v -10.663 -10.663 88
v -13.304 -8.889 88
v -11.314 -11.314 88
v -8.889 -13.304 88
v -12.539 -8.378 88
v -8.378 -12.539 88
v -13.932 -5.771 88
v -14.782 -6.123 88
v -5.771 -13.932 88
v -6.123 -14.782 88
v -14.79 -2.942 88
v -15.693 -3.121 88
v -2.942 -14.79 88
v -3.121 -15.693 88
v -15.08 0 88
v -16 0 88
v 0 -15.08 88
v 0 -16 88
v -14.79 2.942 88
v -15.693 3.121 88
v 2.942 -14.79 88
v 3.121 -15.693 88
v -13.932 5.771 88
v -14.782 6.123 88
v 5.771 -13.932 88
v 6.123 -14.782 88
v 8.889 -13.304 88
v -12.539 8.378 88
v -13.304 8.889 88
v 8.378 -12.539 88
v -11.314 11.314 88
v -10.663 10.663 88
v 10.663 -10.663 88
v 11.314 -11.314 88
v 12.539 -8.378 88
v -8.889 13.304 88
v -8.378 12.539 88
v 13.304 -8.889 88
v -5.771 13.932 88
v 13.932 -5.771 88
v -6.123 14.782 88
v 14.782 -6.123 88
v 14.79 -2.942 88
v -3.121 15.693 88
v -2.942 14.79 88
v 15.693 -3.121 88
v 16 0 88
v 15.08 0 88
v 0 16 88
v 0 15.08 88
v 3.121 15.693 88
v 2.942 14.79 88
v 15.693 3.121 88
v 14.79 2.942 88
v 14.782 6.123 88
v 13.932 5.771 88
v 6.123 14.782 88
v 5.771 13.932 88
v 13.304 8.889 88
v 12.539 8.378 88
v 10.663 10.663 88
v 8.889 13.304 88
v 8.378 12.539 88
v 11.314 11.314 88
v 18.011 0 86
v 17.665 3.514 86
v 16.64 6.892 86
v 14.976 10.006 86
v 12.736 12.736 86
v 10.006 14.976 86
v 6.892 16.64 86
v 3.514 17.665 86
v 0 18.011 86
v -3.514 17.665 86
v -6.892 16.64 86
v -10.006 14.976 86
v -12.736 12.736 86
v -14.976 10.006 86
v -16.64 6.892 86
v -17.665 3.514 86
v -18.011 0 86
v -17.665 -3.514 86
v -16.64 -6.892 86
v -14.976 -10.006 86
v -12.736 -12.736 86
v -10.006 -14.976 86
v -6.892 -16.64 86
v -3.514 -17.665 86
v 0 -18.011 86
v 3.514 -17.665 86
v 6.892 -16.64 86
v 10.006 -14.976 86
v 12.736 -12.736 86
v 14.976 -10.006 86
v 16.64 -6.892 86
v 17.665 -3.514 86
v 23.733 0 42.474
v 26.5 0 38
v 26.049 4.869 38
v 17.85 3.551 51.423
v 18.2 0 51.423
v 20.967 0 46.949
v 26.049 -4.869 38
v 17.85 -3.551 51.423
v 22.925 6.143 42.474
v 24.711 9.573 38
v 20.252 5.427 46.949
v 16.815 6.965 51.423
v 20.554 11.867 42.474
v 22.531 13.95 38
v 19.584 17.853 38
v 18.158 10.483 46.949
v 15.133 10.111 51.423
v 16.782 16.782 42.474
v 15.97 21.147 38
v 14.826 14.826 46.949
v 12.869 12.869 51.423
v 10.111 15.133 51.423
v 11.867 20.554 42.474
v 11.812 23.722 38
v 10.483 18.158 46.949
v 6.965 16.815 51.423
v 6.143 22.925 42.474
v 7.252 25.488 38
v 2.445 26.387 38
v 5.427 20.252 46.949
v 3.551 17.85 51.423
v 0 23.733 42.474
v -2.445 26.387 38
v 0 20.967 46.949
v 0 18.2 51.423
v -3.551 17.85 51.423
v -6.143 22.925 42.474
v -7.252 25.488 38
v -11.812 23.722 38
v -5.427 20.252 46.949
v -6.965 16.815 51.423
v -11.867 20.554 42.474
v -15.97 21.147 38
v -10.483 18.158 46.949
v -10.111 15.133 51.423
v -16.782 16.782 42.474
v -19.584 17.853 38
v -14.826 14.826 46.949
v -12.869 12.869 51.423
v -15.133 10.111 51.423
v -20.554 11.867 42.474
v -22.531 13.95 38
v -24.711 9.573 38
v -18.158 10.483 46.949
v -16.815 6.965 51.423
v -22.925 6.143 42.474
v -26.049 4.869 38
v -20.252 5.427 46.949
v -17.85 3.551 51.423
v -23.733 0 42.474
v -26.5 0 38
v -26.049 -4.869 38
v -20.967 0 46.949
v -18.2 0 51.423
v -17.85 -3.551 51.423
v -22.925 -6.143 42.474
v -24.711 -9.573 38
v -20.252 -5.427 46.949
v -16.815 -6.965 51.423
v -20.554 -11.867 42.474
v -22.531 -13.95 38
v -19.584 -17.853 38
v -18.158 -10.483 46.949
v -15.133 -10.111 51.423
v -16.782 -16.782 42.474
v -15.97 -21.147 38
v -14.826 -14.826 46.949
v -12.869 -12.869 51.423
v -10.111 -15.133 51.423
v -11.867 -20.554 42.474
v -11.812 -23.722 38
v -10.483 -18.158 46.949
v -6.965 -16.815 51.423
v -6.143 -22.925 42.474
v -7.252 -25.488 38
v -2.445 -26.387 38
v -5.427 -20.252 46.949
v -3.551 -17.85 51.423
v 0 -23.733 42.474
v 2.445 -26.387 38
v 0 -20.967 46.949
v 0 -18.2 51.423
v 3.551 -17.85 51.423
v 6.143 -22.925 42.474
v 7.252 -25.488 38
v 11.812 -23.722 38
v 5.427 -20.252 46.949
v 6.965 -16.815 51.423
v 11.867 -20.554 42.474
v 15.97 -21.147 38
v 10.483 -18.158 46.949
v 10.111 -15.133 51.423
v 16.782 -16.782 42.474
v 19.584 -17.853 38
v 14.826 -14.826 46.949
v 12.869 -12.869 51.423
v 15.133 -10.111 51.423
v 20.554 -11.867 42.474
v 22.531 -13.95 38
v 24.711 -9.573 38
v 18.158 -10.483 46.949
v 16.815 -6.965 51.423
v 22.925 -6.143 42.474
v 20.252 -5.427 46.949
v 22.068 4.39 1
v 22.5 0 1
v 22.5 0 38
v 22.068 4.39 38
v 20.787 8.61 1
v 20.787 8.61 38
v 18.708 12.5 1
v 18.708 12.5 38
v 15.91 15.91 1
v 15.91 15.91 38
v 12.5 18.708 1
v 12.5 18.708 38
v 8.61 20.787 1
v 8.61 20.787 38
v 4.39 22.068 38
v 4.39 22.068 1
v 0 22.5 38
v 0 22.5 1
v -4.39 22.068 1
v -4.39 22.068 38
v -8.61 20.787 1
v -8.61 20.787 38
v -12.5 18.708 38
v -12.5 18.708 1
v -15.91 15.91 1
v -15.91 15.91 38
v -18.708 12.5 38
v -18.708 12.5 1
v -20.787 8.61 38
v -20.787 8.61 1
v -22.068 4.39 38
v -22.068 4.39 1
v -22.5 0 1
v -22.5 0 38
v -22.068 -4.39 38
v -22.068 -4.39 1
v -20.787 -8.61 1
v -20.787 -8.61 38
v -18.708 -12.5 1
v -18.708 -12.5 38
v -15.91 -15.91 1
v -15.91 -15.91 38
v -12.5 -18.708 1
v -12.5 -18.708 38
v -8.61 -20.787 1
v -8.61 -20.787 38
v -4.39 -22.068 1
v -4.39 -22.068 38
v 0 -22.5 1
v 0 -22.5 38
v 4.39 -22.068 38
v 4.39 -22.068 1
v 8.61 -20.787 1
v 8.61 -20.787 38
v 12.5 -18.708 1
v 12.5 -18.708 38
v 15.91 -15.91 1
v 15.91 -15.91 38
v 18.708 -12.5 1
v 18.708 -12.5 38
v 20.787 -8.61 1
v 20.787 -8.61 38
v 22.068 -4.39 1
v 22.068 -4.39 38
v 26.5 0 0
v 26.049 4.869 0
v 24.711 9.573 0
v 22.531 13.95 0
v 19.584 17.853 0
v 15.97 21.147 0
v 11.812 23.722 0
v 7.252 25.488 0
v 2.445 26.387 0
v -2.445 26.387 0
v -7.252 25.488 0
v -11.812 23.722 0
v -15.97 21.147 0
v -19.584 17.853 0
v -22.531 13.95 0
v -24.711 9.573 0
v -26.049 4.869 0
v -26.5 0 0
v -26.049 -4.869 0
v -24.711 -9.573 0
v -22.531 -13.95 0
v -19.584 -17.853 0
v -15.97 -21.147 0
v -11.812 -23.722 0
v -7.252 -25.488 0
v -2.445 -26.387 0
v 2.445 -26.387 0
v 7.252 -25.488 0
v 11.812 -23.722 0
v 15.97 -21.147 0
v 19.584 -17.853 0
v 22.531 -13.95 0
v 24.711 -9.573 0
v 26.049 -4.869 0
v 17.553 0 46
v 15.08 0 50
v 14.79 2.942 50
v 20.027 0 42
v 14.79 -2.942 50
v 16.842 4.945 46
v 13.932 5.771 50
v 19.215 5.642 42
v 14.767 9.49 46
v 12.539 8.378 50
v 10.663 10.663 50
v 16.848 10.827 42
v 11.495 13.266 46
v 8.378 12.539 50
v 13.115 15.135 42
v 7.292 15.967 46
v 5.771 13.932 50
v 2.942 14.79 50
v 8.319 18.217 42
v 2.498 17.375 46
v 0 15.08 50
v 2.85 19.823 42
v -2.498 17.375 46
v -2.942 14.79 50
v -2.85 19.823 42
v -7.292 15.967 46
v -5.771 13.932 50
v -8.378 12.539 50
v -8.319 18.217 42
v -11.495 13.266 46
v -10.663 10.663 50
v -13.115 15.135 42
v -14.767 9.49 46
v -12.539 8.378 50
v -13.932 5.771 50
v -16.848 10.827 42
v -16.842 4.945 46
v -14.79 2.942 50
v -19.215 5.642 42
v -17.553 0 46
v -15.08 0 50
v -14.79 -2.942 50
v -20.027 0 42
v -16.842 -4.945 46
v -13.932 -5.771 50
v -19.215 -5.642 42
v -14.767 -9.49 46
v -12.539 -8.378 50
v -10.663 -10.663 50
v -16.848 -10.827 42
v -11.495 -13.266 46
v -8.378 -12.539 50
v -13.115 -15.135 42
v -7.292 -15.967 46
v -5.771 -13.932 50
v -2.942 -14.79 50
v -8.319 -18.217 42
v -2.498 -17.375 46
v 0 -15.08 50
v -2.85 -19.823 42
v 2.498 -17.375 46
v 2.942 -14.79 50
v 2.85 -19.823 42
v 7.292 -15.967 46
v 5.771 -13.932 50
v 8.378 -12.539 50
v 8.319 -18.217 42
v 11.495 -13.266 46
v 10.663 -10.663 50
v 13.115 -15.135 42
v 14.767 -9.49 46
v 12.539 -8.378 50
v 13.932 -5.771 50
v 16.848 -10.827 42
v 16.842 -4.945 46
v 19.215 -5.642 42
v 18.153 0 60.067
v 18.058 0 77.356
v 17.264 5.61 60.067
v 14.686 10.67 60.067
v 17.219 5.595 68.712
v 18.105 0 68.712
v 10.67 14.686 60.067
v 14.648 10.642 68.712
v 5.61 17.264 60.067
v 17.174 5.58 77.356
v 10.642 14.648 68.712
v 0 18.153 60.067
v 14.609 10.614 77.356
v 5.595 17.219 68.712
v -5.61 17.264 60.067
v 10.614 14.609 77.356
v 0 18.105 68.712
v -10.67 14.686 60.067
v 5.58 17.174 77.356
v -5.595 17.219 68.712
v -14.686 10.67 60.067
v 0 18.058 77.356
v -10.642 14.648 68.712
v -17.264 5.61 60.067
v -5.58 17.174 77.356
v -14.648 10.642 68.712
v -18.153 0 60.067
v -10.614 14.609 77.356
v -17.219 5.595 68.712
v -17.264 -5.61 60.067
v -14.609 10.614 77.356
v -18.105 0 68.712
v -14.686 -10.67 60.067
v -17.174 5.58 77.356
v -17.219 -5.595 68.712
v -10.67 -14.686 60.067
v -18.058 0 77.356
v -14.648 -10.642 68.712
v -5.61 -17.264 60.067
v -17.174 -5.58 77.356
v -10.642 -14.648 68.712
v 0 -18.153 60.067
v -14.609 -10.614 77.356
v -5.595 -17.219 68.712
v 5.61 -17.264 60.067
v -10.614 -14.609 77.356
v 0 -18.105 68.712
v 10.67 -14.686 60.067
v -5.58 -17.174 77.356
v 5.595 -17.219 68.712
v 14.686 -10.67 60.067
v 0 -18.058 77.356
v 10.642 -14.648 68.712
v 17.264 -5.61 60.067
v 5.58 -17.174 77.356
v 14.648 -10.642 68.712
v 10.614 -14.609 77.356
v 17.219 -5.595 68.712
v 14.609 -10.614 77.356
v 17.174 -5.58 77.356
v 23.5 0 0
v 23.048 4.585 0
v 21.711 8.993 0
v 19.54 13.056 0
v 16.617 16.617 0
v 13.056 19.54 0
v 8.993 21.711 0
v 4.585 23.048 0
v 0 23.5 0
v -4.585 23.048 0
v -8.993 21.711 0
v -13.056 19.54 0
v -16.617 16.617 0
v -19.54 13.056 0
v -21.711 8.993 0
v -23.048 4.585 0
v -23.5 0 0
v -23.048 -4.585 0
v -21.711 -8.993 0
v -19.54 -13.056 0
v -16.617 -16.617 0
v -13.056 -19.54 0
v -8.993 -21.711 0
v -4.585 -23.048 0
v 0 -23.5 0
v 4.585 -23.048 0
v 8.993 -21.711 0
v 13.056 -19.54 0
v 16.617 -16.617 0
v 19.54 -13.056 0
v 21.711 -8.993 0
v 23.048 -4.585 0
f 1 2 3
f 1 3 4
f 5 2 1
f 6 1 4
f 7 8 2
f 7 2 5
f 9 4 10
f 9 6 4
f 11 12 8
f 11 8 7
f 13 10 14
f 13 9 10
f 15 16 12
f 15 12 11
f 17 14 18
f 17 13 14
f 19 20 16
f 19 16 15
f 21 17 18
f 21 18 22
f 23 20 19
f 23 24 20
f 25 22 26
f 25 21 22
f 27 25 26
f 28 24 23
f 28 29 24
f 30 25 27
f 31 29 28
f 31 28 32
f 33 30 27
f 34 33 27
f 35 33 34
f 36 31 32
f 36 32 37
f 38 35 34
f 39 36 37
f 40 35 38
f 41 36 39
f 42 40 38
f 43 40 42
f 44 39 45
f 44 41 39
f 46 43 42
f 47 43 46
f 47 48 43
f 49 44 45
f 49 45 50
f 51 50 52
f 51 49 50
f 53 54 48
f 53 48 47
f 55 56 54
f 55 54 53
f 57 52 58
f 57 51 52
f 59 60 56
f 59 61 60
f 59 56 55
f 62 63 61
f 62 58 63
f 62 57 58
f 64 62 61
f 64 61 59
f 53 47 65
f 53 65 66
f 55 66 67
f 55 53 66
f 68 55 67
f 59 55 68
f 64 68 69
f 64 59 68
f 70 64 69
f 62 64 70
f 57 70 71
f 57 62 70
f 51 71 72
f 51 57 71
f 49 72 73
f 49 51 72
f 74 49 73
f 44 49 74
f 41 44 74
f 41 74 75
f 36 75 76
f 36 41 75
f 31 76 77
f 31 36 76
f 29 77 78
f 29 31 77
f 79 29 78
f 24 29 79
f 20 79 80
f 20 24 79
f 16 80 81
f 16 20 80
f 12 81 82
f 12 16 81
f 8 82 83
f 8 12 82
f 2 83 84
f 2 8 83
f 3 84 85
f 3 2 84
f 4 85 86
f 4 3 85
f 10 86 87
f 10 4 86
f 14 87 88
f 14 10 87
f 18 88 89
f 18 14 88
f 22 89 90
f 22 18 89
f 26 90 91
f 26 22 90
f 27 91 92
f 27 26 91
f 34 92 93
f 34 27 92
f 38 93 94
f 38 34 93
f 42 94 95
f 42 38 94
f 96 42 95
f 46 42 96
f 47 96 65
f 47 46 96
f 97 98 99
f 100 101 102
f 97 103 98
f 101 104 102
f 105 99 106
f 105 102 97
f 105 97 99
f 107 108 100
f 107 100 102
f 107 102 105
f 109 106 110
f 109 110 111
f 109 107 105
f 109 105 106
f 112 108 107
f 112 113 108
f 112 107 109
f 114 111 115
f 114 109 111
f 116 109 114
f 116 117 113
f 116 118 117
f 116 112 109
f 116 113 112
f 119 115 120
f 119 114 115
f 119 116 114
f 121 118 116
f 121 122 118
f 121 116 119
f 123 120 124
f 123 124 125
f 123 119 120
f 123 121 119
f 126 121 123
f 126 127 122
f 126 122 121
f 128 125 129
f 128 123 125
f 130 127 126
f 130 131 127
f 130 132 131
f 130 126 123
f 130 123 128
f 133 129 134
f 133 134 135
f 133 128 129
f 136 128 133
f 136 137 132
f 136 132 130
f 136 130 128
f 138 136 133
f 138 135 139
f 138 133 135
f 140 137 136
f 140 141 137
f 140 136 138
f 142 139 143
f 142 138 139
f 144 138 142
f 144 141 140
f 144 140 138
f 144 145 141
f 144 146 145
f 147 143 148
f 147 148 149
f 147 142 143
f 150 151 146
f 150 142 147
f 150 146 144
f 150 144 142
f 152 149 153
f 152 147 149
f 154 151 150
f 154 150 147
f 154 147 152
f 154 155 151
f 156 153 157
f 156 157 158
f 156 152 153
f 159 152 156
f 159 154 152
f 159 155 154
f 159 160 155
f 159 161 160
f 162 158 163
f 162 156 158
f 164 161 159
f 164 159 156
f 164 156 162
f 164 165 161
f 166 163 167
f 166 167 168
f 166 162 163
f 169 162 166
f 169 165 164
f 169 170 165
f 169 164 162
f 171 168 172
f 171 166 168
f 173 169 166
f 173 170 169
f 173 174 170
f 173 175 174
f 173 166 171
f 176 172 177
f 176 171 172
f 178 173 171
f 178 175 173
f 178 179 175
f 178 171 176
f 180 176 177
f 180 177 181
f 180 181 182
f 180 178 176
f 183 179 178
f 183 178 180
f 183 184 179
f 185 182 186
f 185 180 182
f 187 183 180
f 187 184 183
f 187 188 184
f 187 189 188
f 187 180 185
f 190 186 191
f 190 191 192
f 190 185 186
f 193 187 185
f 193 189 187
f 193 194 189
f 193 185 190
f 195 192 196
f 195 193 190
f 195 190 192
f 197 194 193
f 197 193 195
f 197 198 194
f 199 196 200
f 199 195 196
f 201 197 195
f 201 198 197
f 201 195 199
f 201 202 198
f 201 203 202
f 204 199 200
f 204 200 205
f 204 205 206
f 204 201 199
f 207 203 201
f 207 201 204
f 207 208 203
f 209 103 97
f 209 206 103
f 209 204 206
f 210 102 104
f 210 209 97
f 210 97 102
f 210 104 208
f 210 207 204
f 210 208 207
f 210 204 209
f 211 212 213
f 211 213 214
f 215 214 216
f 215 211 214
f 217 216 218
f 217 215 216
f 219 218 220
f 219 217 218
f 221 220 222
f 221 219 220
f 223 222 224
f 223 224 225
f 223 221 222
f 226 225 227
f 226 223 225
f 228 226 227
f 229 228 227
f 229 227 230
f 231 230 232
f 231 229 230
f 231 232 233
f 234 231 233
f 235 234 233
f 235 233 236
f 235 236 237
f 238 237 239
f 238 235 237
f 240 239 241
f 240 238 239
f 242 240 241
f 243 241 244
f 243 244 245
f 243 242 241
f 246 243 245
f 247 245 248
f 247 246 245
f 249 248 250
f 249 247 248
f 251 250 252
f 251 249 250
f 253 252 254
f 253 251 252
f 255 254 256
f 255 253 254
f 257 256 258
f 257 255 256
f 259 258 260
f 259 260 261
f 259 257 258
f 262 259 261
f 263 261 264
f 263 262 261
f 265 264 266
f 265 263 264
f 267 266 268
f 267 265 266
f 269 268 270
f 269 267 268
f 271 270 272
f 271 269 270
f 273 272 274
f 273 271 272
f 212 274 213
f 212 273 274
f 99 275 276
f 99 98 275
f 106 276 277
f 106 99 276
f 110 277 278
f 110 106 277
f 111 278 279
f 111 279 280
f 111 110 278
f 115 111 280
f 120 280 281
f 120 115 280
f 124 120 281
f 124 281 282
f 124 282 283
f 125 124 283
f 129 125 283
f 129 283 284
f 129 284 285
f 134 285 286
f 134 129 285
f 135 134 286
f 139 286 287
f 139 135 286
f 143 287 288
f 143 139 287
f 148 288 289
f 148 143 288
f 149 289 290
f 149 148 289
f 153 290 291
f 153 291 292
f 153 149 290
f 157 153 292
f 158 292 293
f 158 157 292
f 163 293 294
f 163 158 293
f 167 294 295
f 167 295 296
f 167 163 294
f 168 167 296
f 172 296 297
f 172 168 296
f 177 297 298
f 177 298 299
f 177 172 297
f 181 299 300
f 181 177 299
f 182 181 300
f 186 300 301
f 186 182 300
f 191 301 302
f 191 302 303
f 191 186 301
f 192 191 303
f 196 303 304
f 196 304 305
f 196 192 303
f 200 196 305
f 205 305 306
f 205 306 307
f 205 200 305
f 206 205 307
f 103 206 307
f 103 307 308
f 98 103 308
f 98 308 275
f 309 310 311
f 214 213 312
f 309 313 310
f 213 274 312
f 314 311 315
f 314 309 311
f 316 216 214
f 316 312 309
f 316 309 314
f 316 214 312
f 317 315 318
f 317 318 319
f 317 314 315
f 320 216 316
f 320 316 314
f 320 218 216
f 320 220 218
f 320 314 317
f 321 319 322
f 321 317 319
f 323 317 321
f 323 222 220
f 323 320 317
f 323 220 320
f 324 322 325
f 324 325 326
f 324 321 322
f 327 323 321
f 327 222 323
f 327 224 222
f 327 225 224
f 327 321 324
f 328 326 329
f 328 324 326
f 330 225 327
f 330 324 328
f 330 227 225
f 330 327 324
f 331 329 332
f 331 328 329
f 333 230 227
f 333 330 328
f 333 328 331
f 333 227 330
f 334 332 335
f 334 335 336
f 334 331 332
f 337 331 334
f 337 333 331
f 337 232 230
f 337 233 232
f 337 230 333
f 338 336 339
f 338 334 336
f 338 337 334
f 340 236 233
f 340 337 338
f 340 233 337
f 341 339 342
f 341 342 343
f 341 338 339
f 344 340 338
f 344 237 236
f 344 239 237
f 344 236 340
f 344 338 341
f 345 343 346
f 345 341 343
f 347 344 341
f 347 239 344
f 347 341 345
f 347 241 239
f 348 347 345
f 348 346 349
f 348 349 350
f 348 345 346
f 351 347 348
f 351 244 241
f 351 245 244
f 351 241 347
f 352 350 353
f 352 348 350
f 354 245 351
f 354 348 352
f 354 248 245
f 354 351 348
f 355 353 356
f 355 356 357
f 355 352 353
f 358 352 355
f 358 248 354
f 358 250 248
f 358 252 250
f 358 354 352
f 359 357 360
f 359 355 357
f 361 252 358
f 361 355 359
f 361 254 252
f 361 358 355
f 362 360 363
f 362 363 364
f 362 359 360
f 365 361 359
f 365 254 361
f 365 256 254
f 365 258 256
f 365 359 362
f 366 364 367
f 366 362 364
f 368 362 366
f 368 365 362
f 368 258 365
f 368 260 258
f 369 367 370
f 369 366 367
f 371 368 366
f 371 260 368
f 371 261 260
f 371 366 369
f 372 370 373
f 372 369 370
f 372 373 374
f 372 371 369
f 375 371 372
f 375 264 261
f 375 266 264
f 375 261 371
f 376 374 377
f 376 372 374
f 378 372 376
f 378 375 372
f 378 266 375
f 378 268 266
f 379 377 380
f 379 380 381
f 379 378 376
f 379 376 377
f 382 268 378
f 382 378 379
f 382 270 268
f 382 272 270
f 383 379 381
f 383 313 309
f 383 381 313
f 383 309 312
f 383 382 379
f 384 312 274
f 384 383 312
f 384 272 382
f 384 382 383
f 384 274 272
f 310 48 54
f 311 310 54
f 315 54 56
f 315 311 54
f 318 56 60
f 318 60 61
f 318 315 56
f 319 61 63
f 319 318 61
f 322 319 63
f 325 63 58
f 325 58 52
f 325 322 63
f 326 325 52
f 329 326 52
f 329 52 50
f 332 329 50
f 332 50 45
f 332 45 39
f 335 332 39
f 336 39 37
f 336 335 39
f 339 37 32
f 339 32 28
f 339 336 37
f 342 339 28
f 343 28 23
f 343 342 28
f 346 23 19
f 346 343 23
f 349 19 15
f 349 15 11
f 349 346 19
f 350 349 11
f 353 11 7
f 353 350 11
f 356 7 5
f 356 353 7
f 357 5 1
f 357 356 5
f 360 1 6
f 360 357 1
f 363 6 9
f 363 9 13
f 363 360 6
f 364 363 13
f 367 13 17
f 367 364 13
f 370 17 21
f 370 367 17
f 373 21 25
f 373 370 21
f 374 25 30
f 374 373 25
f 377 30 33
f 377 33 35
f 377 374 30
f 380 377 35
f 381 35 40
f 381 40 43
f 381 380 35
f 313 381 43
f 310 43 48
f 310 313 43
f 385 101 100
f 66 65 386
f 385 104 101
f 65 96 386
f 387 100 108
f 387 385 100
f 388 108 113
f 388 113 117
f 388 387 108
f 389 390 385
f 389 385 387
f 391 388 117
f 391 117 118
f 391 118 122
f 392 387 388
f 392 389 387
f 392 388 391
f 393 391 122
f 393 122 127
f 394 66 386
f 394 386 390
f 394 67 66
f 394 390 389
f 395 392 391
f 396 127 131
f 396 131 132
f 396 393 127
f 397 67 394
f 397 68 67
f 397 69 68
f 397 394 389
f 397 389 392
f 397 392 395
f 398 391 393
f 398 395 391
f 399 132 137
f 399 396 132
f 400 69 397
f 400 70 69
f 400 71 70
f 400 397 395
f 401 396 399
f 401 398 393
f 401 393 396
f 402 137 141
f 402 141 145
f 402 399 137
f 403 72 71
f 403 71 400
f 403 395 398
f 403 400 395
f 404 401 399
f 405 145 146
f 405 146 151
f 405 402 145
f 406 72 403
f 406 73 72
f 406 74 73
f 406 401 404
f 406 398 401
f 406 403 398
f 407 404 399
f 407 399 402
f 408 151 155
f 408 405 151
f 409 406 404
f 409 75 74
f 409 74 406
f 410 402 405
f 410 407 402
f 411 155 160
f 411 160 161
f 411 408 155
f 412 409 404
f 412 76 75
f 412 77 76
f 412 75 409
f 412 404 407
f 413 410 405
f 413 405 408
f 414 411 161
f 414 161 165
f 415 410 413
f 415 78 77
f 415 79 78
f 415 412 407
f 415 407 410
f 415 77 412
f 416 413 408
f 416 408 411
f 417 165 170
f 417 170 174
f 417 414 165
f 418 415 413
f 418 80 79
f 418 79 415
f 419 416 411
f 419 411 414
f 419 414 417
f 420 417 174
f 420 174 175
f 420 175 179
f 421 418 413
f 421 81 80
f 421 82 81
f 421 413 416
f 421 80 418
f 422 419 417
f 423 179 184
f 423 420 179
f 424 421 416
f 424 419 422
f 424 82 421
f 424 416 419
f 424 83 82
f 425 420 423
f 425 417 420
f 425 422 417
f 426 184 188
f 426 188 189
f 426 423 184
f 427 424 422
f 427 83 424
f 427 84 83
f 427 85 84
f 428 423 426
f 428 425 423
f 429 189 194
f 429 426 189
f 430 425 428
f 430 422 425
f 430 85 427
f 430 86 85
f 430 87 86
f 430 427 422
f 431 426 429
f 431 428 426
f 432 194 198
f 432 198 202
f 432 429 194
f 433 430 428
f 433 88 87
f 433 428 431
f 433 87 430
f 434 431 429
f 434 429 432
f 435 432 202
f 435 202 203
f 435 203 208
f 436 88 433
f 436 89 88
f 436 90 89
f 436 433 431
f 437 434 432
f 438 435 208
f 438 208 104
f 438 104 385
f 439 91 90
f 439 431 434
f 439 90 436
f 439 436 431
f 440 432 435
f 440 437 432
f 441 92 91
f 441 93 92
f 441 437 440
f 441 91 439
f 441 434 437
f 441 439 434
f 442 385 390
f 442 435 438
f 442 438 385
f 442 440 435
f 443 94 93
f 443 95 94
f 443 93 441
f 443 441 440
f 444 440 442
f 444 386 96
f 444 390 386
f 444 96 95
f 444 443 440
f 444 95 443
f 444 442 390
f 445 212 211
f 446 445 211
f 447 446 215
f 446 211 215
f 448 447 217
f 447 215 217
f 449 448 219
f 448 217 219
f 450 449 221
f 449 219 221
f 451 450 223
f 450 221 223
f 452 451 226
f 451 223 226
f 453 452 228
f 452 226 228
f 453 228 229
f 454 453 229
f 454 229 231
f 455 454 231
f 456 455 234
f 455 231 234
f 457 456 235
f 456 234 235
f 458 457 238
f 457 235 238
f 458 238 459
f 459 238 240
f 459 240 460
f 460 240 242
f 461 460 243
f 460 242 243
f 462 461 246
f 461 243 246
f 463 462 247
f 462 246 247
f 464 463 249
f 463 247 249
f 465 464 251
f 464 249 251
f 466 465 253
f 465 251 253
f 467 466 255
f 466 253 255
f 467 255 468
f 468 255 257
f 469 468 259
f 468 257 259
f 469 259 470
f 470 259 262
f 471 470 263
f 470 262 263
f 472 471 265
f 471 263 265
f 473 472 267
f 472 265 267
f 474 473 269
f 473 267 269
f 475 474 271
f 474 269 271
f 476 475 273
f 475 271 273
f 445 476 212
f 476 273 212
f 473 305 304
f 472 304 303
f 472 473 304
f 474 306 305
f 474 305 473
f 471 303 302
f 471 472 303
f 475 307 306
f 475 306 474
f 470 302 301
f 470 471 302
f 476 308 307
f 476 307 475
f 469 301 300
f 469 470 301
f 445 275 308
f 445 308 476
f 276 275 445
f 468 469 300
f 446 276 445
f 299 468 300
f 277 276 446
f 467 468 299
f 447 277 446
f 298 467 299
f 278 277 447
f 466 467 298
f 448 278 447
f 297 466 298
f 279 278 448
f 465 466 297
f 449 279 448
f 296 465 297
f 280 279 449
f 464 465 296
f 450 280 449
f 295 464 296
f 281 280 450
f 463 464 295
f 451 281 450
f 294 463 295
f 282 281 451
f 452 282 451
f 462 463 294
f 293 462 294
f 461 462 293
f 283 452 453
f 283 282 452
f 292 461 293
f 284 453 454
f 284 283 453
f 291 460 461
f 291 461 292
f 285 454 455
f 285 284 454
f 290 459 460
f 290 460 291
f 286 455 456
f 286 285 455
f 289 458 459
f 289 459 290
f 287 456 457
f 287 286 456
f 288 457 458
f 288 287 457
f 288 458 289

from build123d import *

# Parameters (mm, degrees)
F2_SIZE = 2
F3_SIZE = 1


with BuildPart() as f1:
    # F0 (on Front) → F1 (revolve)
    with BuildSketch(Plane.XZ):
        Polygon((22.5, 38), (22.5, 0), (26.5, 0), (26.5, 38), (18.2, 51.423181), (18, 88), (15.08, 88), (15.08, 50), align=None)
    revolve(axis=Axis((0, 0, 38.390822), (0, 0, 1)))

    # F2
    f2_edges = [f1.edges().sort_by_distance(p)[0] for p in [
        (-18, 0, 88),
    ]]
    chamfer(f2_edges, length=F2_SIZE)

    # F3
    f3_edges = [f1.edges().sort_by_distance(p)[0] for p in [
        (-22.5, 0, 0),
    ]]
    chamfer(f3_edges, length=F3_SIZE)


solid = f1.part
